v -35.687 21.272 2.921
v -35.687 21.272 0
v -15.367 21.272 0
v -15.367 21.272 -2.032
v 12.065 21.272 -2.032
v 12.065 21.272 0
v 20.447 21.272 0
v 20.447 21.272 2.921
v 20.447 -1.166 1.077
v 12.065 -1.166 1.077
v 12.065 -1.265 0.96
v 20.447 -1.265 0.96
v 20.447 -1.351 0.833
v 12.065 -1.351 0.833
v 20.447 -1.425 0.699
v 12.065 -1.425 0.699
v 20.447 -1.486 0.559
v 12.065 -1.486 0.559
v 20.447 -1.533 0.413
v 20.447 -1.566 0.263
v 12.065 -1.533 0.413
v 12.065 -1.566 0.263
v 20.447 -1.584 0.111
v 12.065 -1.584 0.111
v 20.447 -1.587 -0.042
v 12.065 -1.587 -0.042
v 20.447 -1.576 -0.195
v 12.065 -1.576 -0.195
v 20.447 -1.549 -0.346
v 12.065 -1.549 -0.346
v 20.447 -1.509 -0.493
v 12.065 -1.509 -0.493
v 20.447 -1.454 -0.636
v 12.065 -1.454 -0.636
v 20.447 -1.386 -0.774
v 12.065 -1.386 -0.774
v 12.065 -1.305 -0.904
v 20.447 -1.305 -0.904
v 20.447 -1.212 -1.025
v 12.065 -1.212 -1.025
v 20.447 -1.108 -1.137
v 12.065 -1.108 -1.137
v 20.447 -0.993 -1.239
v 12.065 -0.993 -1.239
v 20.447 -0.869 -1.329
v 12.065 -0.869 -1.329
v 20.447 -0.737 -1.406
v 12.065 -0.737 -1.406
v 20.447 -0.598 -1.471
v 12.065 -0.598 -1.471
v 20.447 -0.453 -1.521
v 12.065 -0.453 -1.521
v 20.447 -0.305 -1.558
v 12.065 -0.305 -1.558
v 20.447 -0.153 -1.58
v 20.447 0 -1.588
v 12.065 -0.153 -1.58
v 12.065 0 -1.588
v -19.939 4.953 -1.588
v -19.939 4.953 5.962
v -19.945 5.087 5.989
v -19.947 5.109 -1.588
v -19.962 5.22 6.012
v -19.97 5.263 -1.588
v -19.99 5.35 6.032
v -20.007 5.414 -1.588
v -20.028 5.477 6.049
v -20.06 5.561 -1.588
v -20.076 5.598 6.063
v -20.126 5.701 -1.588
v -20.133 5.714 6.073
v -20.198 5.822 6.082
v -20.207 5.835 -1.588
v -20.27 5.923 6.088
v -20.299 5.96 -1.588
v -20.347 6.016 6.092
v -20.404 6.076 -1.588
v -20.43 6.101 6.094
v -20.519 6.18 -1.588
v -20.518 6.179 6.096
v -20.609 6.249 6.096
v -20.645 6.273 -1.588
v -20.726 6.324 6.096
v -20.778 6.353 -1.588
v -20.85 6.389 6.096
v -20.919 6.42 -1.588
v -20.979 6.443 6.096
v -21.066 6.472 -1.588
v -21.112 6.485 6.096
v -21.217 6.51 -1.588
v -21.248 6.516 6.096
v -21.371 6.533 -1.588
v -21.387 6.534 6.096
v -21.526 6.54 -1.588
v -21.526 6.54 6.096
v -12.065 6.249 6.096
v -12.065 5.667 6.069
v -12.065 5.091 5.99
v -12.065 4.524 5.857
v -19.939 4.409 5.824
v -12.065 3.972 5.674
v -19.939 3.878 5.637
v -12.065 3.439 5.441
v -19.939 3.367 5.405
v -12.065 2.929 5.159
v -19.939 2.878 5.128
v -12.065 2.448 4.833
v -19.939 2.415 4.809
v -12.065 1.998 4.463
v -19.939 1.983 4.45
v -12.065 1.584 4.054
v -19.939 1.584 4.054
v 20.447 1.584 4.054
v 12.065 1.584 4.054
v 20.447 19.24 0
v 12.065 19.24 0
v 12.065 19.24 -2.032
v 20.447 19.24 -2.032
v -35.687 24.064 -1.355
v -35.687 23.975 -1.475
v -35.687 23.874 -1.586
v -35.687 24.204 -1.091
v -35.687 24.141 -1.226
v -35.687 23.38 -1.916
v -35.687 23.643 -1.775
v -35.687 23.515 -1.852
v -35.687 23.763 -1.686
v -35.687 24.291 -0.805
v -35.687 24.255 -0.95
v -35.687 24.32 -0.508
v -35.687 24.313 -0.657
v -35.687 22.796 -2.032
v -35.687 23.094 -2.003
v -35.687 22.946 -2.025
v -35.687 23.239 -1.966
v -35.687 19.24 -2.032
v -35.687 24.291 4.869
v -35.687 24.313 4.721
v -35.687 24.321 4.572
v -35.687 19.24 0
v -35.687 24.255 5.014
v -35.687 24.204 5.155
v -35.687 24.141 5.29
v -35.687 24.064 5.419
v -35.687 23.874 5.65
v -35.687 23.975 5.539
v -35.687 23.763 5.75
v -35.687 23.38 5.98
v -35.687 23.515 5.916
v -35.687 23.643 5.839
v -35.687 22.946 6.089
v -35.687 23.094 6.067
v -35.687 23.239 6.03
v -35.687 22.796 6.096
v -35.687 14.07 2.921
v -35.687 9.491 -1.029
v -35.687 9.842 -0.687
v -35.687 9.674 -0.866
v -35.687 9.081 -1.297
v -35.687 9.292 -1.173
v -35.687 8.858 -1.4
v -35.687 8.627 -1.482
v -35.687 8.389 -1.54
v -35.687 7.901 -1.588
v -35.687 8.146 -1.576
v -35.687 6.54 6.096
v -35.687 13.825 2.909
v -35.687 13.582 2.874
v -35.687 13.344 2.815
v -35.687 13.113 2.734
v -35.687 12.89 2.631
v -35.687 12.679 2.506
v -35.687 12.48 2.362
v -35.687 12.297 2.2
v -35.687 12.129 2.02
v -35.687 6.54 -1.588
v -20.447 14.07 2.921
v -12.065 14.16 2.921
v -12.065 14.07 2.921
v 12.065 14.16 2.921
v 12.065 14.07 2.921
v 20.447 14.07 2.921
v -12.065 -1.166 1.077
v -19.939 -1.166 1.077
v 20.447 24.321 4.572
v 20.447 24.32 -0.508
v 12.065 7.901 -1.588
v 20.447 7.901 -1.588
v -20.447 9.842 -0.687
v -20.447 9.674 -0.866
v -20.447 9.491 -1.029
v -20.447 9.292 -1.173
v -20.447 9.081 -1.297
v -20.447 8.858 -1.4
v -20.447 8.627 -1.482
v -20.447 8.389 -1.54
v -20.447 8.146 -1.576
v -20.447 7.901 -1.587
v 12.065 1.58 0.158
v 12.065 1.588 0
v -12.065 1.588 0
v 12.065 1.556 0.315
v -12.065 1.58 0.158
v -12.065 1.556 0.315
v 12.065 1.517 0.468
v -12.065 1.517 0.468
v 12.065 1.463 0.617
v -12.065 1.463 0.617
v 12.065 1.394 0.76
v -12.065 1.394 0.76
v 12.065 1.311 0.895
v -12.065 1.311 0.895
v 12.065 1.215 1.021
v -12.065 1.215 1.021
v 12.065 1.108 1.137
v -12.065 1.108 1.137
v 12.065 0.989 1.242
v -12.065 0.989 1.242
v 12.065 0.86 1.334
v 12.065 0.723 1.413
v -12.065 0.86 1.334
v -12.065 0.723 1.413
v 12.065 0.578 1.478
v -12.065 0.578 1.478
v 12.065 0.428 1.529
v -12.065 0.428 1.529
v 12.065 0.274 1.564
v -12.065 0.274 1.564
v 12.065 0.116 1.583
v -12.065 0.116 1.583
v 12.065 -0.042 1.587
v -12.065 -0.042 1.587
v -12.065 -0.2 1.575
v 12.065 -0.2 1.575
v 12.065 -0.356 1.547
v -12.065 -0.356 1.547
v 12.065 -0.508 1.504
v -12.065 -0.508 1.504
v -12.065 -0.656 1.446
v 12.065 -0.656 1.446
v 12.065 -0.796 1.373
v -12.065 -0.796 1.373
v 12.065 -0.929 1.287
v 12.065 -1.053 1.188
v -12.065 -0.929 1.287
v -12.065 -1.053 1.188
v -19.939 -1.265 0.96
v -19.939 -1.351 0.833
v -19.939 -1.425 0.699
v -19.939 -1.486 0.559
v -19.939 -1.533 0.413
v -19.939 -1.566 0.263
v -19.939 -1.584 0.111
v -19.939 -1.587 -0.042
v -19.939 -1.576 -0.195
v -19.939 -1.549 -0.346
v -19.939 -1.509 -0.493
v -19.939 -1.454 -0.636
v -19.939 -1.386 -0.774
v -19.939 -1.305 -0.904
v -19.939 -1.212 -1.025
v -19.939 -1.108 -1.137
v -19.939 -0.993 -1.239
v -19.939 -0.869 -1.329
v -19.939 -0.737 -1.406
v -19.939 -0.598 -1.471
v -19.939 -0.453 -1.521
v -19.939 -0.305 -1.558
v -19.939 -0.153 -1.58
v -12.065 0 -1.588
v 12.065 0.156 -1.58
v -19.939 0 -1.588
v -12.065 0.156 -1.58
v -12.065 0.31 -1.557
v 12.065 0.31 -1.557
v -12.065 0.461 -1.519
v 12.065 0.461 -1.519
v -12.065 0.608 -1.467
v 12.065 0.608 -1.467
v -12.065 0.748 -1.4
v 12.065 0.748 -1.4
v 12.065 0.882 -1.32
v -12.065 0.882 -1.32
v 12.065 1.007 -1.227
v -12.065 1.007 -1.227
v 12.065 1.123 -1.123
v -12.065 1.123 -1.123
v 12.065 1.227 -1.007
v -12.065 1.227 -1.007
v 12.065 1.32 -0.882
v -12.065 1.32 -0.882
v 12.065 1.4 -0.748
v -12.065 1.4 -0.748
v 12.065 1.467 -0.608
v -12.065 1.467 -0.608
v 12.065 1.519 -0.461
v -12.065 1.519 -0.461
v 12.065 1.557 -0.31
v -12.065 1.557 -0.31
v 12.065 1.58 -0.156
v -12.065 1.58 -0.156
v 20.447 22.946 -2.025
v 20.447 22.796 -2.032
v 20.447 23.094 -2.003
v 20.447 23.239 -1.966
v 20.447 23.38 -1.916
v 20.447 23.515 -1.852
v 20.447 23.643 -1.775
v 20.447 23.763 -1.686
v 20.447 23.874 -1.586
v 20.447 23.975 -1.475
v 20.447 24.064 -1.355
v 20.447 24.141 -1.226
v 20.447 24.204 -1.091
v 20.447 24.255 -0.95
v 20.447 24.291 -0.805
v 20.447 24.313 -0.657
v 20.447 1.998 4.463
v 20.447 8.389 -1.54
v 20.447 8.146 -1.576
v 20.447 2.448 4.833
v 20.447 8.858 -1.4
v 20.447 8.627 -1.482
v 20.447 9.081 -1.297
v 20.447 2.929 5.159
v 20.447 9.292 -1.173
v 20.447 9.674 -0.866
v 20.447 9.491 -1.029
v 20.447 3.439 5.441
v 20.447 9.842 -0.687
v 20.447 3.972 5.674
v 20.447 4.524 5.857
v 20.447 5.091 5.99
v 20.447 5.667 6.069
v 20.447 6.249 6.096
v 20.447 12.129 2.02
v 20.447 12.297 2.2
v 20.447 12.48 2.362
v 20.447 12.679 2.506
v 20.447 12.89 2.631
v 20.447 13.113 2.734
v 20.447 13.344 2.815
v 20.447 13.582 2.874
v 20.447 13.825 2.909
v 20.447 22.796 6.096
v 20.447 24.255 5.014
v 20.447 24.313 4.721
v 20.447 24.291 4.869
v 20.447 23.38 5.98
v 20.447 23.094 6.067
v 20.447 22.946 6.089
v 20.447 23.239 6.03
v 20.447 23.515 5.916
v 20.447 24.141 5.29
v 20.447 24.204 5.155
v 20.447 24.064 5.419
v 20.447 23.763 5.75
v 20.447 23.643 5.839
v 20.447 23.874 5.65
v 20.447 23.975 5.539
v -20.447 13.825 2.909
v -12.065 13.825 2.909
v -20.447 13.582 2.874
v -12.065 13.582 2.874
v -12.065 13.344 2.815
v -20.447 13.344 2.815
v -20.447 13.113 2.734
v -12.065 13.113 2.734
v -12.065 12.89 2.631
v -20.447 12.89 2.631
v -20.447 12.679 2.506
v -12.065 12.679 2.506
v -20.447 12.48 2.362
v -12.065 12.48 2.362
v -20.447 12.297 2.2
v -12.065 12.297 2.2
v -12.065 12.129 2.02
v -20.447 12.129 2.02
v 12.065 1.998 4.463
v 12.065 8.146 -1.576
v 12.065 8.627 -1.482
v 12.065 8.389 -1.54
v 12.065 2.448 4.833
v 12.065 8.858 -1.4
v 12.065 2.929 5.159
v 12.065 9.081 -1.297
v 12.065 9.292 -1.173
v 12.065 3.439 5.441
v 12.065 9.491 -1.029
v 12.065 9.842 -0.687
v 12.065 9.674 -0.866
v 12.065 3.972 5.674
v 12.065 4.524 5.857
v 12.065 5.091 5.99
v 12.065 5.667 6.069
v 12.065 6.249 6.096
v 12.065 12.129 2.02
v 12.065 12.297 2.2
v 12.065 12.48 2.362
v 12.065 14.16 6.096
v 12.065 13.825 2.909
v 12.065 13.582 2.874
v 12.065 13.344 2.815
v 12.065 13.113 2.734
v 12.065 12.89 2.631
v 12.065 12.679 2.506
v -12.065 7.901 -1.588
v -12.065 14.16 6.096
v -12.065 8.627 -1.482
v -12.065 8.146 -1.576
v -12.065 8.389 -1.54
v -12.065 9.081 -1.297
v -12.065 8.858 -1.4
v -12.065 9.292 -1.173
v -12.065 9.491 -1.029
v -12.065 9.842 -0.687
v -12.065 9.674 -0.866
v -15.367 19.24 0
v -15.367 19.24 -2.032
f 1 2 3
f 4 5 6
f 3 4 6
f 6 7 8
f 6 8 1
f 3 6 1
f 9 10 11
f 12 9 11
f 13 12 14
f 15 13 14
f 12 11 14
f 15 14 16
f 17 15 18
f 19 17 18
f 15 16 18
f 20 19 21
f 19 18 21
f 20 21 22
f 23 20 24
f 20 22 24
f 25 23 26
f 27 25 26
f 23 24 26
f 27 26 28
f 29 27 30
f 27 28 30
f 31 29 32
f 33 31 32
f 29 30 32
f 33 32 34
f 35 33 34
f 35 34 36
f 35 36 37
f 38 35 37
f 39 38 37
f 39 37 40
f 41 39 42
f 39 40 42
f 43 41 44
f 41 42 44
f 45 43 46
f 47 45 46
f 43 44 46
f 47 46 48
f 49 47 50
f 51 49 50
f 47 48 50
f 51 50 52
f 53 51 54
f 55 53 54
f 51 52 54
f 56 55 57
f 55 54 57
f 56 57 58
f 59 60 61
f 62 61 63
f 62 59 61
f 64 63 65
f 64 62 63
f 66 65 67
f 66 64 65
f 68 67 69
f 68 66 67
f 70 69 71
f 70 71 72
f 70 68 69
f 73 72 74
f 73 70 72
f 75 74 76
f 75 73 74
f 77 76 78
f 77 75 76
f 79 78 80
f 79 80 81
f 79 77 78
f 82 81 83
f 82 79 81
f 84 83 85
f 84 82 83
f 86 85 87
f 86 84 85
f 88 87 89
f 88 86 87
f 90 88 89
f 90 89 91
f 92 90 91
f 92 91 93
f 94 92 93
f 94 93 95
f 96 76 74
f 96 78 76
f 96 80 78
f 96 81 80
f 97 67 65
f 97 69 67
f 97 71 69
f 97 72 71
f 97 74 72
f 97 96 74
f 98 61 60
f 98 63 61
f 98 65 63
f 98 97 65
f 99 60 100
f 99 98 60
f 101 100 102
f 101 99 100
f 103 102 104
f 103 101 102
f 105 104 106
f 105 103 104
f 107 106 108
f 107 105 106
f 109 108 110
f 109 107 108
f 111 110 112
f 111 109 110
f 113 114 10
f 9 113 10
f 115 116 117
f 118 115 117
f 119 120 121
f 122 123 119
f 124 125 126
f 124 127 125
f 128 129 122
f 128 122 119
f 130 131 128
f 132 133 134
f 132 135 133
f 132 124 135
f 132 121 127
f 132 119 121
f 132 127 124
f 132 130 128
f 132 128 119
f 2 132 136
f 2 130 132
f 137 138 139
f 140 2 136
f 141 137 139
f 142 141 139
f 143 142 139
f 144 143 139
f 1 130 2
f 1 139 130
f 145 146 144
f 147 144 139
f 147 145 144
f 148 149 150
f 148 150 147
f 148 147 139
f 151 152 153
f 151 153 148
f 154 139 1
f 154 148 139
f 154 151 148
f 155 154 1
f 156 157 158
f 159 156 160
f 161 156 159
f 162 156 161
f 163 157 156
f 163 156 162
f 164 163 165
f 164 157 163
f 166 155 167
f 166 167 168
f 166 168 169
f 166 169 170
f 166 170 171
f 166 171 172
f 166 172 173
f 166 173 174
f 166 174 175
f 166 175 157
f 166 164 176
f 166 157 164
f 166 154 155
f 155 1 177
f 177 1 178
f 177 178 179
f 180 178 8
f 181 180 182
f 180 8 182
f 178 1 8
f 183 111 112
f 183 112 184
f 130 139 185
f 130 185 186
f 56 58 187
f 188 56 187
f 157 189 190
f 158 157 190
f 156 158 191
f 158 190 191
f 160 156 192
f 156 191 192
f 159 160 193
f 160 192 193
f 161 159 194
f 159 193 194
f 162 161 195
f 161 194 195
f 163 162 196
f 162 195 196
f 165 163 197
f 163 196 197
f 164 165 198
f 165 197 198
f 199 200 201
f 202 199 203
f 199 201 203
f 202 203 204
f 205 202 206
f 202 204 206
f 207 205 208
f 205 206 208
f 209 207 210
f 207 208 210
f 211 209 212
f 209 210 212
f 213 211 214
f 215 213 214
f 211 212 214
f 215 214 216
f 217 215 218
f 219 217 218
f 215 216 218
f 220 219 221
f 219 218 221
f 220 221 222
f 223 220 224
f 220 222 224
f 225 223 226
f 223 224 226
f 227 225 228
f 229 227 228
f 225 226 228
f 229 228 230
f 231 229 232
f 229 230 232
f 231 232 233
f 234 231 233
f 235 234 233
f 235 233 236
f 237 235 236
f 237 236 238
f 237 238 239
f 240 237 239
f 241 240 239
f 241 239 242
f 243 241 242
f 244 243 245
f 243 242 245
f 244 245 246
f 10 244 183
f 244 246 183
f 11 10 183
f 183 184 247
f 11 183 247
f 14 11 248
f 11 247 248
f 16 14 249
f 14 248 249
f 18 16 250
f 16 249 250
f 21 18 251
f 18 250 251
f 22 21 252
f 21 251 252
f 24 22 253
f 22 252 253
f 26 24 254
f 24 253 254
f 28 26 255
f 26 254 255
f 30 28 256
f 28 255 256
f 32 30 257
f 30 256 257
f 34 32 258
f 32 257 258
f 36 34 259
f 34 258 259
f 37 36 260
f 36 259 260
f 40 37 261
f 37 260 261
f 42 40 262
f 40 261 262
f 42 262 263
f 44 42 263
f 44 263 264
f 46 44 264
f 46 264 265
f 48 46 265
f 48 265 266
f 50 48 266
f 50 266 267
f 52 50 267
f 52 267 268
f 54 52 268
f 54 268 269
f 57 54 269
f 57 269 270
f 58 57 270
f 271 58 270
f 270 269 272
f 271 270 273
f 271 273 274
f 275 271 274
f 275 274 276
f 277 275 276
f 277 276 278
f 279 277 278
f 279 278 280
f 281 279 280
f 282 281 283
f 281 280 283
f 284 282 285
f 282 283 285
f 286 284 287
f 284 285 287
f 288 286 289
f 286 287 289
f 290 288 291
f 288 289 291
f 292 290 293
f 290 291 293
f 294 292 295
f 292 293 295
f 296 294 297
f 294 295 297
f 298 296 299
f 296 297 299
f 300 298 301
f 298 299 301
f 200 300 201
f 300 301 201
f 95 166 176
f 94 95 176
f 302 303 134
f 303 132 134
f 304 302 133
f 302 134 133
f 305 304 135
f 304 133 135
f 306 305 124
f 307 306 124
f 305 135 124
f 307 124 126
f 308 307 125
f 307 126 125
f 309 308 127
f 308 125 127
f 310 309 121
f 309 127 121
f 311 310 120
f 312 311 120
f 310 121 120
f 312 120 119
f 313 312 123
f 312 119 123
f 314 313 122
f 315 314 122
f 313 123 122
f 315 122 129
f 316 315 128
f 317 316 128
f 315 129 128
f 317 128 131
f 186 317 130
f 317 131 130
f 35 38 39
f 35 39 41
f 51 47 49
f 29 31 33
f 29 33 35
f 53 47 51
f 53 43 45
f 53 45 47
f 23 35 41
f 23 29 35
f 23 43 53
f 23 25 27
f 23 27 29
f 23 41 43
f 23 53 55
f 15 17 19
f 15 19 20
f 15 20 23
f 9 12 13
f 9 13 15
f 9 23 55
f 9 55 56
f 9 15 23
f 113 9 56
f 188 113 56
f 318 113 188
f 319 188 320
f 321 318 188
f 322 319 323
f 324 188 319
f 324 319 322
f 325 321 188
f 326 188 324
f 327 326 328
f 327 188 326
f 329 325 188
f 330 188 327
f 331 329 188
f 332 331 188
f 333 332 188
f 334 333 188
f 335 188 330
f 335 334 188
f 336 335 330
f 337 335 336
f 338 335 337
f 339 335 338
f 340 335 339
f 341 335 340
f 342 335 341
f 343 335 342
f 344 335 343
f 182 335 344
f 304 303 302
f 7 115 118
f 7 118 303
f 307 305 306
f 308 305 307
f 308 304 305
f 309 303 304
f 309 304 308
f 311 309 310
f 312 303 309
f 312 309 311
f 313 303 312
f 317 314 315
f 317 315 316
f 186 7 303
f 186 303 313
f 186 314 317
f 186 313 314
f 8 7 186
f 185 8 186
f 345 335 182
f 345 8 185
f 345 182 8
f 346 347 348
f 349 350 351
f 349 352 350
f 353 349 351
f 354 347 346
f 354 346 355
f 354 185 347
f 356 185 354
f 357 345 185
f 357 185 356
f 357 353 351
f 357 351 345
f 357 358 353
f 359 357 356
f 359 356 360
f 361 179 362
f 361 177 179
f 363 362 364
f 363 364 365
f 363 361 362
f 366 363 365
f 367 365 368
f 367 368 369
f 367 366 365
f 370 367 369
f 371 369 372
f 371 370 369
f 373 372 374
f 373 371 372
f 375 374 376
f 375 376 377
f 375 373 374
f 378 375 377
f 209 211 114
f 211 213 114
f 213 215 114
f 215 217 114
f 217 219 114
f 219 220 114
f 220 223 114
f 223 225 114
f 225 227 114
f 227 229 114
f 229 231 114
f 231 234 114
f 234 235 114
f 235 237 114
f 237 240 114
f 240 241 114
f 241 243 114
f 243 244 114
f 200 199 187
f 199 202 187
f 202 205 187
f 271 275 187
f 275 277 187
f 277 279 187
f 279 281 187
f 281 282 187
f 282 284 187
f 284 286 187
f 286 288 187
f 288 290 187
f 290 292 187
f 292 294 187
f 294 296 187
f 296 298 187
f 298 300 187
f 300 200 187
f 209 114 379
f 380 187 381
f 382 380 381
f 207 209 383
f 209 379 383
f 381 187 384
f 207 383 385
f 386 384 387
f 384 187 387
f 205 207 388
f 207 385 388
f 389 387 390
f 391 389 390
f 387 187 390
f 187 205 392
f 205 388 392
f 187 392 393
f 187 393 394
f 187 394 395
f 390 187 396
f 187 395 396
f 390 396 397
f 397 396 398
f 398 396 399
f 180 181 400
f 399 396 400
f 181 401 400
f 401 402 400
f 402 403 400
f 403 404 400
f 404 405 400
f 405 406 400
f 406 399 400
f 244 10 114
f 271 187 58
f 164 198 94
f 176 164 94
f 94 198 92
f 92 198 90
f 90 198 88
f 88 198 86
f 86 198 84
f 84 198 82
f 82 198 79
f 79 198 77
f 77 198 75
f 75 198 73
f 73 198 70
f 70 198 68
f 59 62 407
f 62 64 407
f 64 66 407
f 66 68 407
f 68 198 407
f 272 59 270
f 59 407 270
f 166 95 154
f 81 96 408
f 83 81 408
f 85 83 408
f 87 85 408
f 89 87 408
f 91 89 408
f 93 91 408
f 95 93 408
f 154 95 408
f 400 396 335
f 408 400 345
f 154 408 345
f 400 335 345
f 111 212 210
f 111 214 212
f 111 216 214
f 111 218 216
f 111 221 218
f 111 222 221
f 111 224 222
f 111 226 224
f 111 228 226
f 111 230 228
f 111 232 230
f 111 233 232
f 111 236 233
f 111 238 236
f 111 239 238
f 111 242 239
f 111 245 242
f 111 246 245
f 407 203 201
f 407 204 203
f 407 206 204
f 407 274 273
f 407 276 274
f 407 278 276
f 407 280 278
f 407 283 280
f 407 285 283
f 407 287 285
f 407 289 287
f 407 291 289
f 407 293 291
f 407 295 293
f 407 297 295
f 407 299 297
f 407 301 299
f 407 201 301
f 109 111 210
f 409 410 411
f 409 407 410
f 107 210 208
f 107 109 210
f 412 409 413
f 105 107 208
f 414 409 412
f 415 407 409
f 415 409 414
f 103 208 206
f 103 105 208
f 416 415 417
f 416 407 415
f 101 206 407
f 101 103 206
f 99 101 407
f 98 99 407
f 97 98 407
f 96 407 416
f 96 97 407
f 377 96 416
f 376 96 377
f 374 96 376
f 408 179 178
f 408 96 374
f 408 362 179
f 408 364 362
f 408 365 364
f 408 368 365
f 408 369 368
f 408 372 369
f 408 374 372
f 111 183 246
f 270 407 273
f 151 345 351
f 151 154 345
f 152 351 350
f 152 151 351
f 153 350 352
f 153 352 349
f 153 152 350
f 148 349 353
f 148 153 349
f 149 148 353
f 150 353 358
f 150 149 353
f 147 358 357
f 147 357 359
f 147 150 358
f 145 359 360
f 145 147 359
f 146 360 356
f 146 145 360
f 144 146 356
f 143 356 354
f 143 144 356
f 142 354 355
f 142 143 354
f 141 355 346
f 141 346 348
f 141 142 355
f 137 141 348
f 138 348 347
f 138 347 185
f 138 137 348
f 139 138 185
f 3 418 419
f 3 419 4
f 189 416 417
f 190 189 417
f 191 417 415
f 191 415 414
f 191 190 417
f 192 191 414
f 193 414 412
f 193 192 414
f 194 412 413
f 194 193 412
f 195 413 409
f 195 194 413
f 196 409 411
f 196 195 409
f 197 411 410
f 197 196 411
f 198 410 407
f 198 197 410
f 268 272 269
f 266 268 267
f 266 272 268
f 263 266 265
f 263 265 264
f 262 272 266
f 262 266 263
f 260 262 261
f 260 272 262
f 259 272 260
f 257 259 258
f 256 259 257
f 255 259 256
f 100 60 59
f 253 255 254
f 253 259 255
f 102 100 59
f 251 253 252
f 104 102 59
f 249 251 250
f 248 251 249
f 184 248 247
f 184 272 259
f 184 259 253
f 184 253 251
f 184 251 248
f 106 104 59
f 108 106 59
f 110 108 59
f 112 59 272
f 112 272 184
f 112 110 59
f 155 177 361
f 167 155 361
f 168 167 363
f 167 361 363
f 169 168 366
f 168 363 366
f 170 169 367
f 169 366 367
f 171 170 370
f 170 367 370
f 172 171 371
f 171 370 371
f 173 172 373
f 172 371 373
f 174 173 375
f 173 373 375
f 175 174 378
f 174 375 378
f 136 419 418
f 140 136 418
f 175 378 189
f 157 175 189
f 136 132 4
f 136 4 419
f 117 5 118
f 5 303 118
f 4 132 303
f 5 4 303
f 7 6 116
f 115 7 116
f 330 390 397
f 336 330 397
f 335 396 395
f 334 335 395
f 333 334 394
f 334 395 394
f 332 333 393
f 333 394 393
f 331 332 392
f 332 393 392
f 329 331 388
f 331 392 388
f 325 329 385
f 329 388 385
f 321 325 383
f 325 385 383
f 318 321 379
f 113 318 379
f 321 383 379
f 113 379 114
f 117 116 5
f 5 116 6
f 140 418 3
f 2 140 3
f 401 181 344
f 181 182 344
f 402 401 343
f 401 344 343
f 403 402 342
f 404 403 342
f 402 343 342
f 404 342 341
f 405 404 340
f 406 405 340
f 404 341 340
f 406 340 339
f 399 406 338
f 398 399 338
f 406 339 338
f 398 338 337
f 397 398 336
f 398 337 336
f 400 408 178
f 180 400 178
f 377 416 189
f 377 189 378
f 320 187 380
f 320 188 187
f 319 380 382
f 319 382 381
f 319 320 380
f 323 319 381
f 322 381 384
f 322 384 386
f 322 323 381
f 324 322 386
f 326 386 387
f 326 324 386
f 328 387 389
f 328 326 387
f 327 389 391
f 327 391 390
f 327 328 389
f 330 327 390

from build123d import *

# Parameters (mm, degrees)
F0_R      = 1.5875
F1_DEPTH  = 12.065
F3_DEPTH  = 8.382
F6_DEPTH  = 24.13
F7_R      = 2.54
F9_DEPTH  = 15.24
F11_DEPTH = 0.508
F12_R     = 1.524
F13_W     = 2.032
F13_H     = 2.032
F14_DEPTH = 3.302
F15_R     = 1.5875


with BuildPart() as f1:
    # F0 (on Right) → F1 (new body)
    with BuildSketch(Plane.YZ):
        Circle(F0_R)
    extrude(amount=F1_DEPTH)

    # F2 (on face) → F3 (join)
    with BuildSketch(Plane.YZ.offset(12.065)):
        with BuildLine():
            Line((24.3205, -2.032), (24.3205, 6.096))
            Line((24.3205, 6.096), (6.2485151547, 6.096))
            ThreePointArc((6.2485151547, 6.096), (3.7025695222, 5.5632726287), (1.5838033934, 4.0544758539))
            Line((1.5838033934, 4.0544758539), (-1.1661779403, 1.0771189635))
            ThreePointArc((-1.1661779403, 1.0771189635), (-1.4543181572, -0.6364864081), (0, -1.5875))
            Line((0, -1.5875), (9.0805, -1.5875))
            Line((9.0805, -1.5875), (12.8905, 2.921))
            Line((12.8905, 2.921), (21.2725, 2.921))
            Line((21.2725, 2.921), (21.2725, 0))
            Line((21.2725, 0), (19.2405, 0))
            Line((19.2405, 0), (19.2405, -2.032))
            Line((19.2405, -2.032), (24.3205, -2.032))
        make_face()
    extrude(amount=F3_DEPTH)

    # F4: F1 across plane


with BuildPart() as f1_1:
    add(f1.part)
    add(f1.part.mirror(Plane.YZ))

    # F5 (on face) → F6 (join, through all)
    with BuildSketch(Plane.YZ.offset(-12.065)):
        Polygon((24.3205, -2.032), (24.3205, 6.096), (14.1605, 6.096), (14.1605, 2.921), (21.2725, 2.921), (21.2725, -2.032), align=None)
    extrude(amount=F6_DEPTH)

    # F7
    f7_edges = [f1_1.edges().sort_by_distance(p)[0] for p in [
        (16.256, 9.0805, -1.5875),
        (16.256, 12.8905, 2.921),
        (-16.256, 9.0805, -1.5875),
        (-16.256, 12.8905, 2.921),
    ]]
    fillet(f7_edges, radius=F7_R)

    # F8 (on face) → F9 (join)
    with BuildSketch(Plane(origin=(-20.447, 0, 0), x_dir=(0, -1, 0), z_dir=(-1, 0, 0))):
        with BuildLine():
            Line((-6.5405, 6.096), (-24.3205, 6.096))
            Line((-24.3205, 6.096), (-24.3205, -2.032))
            Line((-24.3205, -2.032), (-19.2405, -2.032))
            Line((-19.2405, -2.032), (-19.2405, 0))
            Line((-19.2405, 0), (-21.2725, 0))
            Line((-21.2725, 0), (-21.2725, 2.921))
            Line((-21.2725, 2.921), (-14.0695243298, 2.921))
            ThreePointArc((-14.0695243298, 2.921), (-13.0000966588, 2.6848933258), (-12.1294871065, 2.020468076))
            Line((-12.1294871065, 2.020468076), (-9.8415128935, -0.686968076))
            ThreePointArc((-9.8415128935, -0.686968076), (-8.9709033412, -1.3513933258), (-7.9014756702, -1.5875))
            Line((-7.9014756702, -1.5875), (-6.5405, -1.5875))
            Line((-6.5405, -1.5875), (-6.5405, 6.096))
        make_face()
    extrude(amount=F9_DEPTH)

    # F10 (on face) → F11 (cut)
    with BuildSketch(Plane(origin=(-20.447, 0, 0), x_dir=(0, -1, 0), z_dir=(-1, 0, 0))):
        with BuildLine():
            ThreePointArc((-1.5838033934, 4.0544758539), (-3.7025695222, 5.5632726287), (-6.2485151547, 6.096))
            Line((-6.2485151547, 6.096), (-6.5405, 6.096))
            Line((-6.5405, 6.096), (-6.5405, -1.5875))
            Line((-6.5405, -1.5875), (0, -1.5875))
            ThreePointArc((0, -1.5875), (1.4543181572, -0.6364864081), (1.1661779403, 1.0771189635))
            Line((1.1661779403, 1.0771189635), (-1.5838033934, 4.0544758539))
        make_face()
    extrude(amount=-F11_DEPTH, mode=Mode.SUBTRACT)

    # F12
    f12_edges = [f1_1.edges().sort_by_distance(p)[0] for p in [
        (-7.62, 24.3205, 6.096),
        (-7.62, 24.3205, -2.032),
    ]]
    fillet(f12_edges, radius=F12_R)

    # F13 (on face) → F14 (cut)
    with BuildSketch(Plane.YZ.offset(-12.065)):
        with Locations((20.2565, -1.016)):
            Rectangle(F13_W, F13_H)
    extrude(amount=-F14_DEPTH, mode=Mode.SUBTRACT)

    # F15
    f15_edges = [f1_1.edges().sort_by_distance(p)[0] for p in [
        (-19.939, 6.5405, 2.25425),
    ]]
    fillet(f15_edges, radius=F15_R)


solid = f1_1.part
